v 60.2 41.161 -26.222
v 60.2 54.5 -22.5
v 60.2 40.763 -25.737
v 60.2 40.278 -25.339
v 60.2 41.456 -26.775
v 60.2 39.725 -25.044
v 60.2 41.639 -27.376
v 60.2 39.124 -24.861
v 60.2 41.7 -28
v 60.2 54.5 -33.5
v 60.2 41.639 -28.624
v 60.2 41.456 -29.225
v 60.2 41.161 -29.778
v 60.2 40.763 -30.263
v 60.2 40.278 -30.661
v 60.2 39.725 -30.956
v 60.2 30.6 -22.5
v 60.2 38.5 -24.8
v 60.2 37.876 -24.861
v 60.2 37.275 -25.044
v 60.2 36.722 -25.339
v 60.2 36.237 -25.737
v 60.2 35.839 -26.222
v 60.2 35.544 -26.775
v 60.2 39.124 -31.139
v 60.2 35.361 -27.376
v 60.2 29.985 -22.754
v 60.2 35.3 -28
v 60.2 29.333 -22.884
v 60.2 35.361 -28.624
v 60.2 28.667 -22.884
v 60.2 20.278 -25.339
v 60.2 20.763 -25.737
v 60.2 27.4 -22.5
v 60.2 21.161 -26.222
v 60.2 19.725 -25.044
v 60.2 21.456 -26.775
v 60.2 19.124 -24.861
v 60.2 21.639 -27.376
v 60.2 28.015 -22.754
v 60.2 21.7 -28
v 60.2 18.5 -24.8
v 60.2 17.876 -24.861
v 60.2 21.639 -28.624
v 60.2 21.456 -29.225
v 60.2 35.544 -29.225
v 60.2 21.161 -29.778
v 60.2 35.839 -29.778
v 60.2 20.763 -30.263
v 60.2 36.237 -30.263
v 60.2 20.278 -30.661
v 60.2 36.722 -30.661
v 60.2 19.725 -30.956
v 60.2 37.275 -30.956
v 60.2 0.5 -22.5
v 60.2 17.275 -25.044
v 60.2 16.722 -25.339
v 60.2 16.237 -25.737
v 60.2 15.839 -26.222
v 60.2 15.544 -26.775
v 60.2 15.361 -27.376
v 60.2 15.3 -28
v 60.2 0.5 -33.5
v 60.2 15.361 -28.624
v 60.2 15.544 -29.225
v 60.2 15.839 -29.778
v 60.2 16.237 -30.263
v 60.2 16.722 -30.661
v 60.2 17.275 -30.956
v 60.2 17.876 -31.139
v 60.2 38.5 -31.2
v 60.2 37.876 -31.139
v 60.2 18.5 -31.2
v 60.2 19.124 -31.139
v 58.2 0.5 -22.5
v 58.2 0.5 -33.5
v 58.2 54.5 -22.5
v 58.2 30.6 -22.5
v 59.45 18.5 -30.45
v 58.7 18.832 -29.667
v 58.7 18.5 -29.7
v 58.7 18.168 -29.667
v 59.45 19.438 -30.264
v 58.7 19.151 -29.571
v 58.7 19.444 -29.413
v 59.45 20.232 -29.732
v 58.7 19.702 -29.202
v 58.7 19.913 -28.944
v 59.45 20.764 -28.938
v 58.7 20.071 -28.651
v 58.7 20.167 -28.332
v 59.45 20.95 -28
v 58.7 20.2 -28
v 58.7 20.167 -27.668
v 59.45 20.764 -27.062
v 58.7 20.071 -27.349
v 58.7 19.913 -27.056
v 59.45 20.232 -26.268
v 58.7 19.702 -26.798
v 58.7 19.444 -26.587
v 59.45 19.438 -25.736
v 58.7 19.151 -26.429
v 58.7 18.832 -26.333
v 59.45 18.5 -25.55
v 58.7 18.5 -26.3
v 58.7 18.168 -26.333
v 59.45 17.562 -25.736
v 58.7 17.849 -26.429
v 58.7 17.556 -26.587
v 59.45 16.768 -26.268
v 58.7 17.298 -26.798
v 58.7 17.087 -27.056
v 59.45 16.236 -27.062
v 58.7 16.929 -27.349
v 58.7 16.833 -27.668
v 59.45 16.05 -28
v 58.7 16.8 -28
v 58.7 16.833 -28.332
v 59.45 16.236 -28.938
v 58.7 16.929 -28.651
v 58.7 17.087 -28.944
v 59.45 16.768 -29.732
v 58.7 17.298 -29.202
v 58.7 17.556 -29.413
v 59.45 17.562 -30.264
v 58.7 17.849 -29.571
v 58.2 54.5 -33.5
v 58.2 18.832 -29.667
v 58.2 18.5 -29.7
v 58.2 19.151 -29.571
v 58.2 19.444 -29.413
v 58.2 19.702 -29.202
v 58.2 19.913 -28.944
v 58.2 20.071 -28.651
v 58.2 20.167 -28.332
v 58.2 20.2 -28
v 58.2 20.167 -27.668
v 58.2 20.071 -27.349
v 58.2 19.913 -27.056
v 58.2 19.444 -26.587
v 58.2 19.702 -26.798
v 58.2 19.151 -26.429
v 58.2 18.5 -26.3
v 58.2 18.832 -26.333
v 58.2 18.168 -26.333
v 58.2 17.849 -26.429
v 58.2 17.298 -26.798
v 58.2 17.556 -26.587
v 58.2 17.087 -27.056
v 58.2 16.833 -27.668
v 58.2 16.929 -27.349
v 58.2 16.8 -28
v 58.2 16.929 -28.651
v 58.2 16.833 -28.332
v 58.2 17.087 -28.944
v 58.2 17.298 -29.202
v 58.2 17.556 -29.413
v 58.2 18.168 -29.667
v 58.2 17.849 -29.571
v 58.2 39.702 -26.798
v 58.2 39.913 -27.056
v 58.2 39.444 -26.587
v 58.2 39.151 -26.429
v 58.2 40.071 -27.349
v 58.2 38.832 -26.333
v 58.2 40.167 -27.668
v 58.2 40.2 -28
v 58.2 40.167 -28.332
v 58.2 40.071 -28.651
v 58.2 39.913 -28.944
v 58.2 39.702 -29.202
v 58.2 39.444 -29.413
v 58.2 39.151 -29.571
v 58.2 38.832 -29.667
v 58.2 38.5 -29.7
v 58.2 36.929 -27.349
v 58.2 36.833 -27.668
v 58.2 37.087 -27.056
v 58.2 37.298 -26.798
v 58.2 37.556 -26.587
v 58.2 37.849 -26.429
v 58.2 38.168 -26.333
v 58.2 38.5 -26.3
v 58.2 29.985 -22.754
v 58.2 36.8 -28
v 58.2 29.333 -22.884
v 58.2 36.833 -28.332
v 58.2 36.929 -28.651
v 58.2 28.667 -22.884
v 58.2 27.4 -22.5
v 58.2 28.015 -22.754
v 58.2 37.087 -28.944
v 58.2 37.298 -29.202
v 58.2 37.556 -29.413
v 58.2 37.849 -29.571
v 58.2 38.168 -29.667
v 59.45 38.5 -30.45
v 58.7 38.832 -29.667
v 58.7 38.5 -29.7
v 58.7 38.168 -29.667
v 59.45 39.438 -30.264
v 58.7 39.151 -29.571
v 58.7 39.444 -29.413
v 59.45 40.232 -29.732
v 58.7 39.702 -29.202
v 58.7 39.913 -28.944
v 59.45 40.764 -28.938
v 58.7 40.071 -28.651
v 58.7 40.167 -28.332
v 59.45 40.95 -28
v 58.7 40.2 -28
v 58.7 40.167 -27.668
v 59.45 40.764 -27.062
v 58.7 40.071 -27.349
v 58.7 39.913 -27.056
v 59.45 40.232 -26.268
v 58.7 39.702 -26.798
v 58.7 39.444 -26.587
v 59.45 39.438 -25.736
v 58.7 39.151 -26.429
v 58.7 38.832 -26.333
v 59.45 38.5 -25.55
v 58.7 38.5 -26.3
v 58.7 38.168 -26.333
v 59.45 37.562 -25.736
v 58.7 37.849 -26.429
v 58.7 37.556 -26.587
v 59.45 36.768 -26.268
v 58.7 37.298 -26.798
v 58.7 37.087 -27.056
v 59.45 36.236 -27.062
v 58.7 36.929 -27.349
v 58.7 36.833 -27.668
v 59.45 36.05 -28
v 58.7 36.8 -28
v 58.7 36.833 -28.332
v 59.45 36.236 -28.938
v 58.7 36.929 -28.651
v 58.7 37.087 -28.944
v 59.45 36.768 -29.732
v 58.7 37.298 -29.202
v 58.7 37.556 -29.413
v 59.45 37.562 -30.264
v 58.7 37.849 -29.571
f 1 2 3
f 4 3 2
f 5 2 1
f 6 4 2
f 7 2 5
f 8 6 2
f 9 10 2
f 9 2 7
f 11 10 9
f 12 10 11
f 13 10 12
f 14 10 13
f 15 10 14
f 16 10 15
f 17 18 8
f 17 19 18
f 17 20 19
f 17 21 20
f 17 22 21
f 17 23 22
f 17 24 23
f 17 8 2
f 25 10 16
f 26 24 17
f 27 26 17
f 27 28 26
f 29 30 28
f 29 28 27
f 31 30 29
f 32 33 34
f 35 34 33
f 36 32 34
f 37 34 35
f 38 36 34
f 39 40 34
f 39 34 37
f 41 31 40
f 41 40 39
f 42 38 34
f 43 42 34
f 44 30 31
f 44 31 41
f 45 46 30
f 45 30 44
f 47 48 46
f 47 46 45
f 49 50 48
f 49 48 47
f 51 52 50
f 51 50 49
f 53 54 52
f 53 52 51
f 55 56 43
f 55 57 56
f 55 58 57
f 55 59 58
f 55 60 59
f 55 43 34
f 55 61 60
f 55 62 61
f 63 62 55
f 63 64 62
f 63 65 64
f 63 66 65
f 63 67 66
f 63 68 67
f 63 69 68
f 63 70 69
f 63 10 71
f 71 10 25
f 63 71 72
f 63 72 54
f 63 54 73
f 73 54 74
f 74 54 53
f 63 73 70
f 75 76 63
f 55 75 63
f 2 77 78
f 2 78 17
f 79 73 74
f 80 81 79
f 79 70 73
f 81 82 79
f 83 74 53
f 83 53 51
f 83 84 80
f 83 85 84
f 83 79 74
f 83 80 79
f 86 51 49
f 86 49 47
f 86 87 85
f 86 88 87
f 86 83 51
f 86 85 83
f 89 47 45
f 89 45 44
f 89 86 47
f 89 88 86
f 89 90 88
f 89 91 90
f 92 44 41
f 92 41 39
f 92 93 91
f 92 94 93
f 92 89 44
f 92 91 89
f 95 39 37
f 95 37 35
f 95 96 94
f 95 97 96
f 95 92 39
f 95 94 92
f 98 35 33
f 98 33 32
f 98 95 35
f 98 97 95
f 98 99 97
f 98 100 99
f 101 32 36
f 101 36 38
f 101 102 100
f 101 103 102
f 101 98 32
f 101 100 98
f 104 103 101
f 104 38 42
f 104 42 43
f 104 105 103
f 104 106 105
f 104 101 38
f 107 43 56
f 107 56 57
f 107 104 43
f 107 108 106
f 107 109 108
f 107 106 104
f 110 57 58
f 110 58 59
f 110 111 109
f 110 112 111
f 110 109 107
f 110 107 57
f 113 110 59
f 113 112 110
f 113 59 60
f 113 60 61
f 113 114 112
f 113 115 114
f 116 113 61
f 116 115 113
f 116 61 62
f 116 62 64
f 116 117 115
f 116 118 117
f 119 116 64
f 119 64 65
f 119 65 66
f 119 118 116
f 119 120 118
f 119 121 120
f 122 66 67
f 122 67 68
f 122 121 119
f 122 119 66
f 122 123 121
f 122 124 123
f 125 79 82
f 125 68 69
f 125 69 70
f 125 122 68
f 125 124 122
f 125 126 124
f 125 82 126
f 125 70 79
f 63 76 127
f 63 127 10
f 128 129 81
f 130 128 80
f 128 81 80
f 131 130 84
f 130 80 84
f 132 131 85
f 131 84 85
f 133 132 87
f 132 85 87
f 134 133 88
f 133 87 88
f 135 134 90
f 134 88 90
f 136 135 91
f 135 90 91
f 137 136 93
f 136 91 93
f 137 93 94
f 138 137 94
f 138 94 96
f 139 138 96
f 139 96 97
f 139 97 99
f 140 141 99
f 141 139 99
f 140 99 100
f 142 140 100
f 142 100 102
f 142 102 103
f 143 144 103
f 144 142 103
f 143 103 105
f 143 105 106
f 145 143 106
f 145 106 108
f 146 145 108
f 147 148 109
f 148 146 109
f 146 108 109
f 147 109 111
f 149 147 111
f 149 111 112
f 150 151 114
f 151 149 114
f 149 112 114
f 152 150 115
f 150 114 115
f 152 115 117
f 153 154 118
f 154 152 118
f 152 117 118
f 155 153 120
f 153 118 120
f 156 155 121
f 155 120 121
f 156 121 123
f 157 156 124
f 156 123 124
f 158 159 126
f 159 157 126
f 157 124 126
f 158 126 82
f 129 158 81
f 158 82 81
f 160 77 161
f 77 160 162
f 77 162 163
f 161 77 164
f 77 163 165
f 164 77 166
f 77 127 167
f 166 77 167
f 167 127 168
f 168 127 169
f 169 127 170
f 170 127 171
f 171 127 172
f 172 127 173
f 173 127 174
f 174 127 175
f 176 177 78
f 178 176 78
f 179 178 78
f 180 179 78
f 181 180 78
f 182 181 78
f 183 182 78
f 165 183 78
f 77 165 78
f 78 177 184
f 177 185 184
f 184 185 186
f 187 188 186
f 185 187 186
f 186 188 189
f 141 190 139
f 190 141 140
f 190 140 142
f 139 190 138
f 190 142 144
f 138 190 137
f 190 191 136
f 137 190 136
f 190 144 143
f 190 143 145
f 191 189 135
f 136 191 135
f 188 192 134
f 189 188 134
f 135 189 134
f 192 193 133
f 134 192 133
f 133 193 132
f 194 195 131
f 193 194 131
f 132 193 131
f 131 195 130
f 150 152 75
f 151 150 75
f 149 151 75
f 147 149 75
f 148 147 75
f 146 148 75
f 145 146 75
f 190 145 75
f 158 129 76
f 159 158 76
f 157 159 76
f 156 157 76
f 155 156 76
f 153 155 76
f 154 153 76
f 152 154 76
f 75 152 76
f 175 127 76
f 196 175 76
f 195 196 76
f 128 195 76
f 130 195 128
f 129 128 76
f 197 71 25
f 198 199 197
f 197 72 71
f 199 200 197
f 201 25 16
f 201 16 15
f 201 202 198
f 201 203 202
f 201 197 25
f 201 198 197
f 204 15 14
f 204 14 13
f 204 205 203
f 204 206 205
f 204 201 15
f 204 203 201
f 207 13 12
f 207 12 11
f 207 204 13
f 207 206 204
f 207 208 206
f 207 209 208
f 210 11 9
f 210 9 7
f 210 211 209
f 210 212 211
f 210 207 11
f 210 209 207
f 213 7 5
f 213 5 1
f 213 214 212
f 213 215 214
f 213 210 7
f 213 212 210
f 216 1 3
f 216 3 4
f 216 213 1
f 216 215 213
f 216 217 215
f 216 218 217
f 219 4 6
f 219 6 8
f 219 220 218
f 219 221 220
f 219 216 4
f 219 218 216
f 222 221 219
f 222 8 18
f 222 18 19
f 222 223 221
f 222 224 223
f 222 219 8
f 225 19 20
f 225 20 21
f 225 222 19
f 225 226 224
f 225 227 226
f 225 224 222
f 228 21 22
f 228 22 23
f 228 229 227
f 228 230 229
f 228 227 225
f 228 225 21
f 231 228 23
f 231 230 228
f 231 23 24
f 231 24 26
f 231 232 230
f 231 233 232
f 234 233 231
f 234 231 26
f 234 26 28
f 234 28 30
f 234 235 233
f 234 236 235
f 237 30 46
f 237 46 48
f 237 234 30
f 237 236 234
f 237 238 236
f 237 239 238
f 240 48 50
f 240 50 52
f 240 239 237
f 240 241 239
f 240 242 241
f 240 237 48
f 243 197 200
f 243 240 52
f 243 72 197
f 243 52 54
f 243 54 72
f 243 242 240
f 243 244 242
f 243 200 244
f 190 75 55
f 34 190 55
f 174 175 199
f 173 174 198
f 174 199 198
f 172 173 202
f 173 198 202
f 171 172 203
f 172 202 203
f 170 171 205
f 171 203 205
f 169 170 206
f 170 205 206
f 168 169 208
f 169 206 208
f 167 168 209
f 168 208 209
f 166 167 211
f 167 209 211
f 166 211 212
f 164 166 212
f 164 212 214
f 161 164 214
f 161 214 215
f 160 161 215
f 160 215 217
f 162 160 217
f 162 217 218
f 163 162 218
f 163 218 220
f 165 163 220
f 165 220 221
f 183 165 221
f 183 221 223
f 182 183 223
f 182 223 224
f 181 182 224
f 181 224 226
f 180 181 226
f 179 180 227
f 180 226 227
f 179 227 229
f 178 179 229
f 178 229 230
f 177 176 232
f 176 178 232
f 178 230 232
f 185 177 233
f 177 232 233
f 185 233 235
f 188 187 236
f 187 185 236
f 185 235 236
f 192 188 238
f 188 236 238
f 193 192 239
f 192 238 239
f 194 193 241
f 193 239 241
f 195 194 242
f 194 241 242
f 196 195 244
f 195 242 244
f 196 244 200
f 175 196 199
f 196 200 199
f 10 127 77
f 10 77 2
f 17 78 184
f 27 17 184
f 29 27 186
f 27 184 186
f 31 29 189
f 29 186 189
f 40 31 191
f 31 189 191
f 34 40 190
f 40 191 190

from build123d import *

# Parameters (mm, degrees)
END_STOP_SHEET_SKETCH_W                   = 2
END_STOP_SHEET_SKETCH_H                   = 54
END_STOP_SHEET_DEPTH                      = 11
SCREW_END_CLEARANCE_SKETCH_R              = 3.4
SCREW_END_CLEARANCE_DEPTH                 = 2.2
M3_COUNTERSUNK_CLEARANCE_1_BORE_PROFILE_R = 1.7
M3_COUNTERSUNK_CLEARANCE_1_BORE_DEPTH     = 2.2
M3_COUNTERSUNK_CLEARANCE_2_BORE_PROFILE_R = 1.7
M3_COUNTERSUNK_CLEARANCE_2_BORE_DEPTH     = 2.2


with BuildPart() as part:
    # End stop sheet sketch → End stop sheet (new body)
    with BuildSketch(Plane.XY.offset(-33.5)):
        with Locations((59.2, -27.5)):
            Rectangle(END_STOP_SHEET_SKETCH_W, END_STOP_SHEET_SKETCH_H)
    extrude(amount=END_STOP_SHEET_DEPTH)

    # Screw end clearance sketch → Screw end clearance (cut)
    with BuildSketch(Plane(origin=(58.1, 0, 0), x_dir=(0, 0, -1), z_dir=(1, 0, 0))):
        with Locations((19.5, -29)):
            Circle(SCREW_END_CLEARANCE_SKETCH_R)
    extrude(amount=SCREW_END_CLEARANCE_DEPTH, mode=Mode.SUBTRACT)

    # M3 countersunk clearance 1 bore profile → M3 countersunk clearance 1 bore (cut)
    with BuildSketch(Plane.ZY.offset(-60.2)):
        with Locations(Location((-28, -18.5, 0), (0, 0, 180))):
            Circle(M3_COUNTERSUNK_CLEARANCE_1_BORE_PROFILE_R)
    extrude(amount=M3_COUNTERSUNK_CLEARANCE_1_BORE_DEPTH, mode=Mode.SUBTRACT)

    # M3 countersunk clearance 1 countersink p → M3 countersunk clearance 1 countersink (revolve, cut)
    with BuildSketch(Plane.XY.offset(-28), mode=Mode.PRIVATE) as m3_countersunk_clearance_1_countersink_sk:
        Polygon((60.2, -18.5), (60.2, -15.3), (58.7, -16.8), (58.7, -18.5), align=None)
    revolve(m3_countersunk_clearance_1_countersink_sk.sketch.rotate(Axis((70.2, -18.5, -28), (-1, 0, 0)), 90), axis=Axis((70.2, -18.5, -28), (-1, 0, 0)), mode=Mode.SUBTRACT)

    # M3 countersunk clearance 2 bore profile → M3 countersunk clearance 2 bore (cut)
    with BuildSketch(Plane.ZY.offset(-60.2)):
        with Locations(Location((-28, -38.5, 0), (0, 0, 180))):
            Circle(M3_COUNTERSUNK_CLEARANCE_2_BORE_PROFILE_R)
    extrude(amount=M3_COUNTERSUNK_CLEARANCE_2_BORE_DEPTH, mode=Mode.SUBTRACT)

    # M3 countersunk clearance 2 countersink p → M3 countersunk clearance 2 countersink (revolve, cut)
    with BuildSketch(Plane.XY.offset(-28), mode=Mode.PRIVATE) as m3_countersunk_clearance_2_countersink_sk:
        Polygon((60.2, -38.5), (60.2, -35.3), (58.7, -36.8), (58.7, -38.5), align=None)
    revolve(m3_countersunk_clearance_2_countersink_sk.sketch.rotate(Axis((70.2, -38.5, -28), (-1, 0, 0)), 90), axis=Axis((70.2, -38.5, -28), (-1, 0, 0)), mode=Mode.SUBTRACT)


with BuildPart() as body_2:
    # Mirror1: mirrored copy
    add(part.part.mirror(Plane(origin=(0, 0, 0), x_dir=(0, 0, 1), z_dir=(0, -1, 0))))


solid = body_2.part
